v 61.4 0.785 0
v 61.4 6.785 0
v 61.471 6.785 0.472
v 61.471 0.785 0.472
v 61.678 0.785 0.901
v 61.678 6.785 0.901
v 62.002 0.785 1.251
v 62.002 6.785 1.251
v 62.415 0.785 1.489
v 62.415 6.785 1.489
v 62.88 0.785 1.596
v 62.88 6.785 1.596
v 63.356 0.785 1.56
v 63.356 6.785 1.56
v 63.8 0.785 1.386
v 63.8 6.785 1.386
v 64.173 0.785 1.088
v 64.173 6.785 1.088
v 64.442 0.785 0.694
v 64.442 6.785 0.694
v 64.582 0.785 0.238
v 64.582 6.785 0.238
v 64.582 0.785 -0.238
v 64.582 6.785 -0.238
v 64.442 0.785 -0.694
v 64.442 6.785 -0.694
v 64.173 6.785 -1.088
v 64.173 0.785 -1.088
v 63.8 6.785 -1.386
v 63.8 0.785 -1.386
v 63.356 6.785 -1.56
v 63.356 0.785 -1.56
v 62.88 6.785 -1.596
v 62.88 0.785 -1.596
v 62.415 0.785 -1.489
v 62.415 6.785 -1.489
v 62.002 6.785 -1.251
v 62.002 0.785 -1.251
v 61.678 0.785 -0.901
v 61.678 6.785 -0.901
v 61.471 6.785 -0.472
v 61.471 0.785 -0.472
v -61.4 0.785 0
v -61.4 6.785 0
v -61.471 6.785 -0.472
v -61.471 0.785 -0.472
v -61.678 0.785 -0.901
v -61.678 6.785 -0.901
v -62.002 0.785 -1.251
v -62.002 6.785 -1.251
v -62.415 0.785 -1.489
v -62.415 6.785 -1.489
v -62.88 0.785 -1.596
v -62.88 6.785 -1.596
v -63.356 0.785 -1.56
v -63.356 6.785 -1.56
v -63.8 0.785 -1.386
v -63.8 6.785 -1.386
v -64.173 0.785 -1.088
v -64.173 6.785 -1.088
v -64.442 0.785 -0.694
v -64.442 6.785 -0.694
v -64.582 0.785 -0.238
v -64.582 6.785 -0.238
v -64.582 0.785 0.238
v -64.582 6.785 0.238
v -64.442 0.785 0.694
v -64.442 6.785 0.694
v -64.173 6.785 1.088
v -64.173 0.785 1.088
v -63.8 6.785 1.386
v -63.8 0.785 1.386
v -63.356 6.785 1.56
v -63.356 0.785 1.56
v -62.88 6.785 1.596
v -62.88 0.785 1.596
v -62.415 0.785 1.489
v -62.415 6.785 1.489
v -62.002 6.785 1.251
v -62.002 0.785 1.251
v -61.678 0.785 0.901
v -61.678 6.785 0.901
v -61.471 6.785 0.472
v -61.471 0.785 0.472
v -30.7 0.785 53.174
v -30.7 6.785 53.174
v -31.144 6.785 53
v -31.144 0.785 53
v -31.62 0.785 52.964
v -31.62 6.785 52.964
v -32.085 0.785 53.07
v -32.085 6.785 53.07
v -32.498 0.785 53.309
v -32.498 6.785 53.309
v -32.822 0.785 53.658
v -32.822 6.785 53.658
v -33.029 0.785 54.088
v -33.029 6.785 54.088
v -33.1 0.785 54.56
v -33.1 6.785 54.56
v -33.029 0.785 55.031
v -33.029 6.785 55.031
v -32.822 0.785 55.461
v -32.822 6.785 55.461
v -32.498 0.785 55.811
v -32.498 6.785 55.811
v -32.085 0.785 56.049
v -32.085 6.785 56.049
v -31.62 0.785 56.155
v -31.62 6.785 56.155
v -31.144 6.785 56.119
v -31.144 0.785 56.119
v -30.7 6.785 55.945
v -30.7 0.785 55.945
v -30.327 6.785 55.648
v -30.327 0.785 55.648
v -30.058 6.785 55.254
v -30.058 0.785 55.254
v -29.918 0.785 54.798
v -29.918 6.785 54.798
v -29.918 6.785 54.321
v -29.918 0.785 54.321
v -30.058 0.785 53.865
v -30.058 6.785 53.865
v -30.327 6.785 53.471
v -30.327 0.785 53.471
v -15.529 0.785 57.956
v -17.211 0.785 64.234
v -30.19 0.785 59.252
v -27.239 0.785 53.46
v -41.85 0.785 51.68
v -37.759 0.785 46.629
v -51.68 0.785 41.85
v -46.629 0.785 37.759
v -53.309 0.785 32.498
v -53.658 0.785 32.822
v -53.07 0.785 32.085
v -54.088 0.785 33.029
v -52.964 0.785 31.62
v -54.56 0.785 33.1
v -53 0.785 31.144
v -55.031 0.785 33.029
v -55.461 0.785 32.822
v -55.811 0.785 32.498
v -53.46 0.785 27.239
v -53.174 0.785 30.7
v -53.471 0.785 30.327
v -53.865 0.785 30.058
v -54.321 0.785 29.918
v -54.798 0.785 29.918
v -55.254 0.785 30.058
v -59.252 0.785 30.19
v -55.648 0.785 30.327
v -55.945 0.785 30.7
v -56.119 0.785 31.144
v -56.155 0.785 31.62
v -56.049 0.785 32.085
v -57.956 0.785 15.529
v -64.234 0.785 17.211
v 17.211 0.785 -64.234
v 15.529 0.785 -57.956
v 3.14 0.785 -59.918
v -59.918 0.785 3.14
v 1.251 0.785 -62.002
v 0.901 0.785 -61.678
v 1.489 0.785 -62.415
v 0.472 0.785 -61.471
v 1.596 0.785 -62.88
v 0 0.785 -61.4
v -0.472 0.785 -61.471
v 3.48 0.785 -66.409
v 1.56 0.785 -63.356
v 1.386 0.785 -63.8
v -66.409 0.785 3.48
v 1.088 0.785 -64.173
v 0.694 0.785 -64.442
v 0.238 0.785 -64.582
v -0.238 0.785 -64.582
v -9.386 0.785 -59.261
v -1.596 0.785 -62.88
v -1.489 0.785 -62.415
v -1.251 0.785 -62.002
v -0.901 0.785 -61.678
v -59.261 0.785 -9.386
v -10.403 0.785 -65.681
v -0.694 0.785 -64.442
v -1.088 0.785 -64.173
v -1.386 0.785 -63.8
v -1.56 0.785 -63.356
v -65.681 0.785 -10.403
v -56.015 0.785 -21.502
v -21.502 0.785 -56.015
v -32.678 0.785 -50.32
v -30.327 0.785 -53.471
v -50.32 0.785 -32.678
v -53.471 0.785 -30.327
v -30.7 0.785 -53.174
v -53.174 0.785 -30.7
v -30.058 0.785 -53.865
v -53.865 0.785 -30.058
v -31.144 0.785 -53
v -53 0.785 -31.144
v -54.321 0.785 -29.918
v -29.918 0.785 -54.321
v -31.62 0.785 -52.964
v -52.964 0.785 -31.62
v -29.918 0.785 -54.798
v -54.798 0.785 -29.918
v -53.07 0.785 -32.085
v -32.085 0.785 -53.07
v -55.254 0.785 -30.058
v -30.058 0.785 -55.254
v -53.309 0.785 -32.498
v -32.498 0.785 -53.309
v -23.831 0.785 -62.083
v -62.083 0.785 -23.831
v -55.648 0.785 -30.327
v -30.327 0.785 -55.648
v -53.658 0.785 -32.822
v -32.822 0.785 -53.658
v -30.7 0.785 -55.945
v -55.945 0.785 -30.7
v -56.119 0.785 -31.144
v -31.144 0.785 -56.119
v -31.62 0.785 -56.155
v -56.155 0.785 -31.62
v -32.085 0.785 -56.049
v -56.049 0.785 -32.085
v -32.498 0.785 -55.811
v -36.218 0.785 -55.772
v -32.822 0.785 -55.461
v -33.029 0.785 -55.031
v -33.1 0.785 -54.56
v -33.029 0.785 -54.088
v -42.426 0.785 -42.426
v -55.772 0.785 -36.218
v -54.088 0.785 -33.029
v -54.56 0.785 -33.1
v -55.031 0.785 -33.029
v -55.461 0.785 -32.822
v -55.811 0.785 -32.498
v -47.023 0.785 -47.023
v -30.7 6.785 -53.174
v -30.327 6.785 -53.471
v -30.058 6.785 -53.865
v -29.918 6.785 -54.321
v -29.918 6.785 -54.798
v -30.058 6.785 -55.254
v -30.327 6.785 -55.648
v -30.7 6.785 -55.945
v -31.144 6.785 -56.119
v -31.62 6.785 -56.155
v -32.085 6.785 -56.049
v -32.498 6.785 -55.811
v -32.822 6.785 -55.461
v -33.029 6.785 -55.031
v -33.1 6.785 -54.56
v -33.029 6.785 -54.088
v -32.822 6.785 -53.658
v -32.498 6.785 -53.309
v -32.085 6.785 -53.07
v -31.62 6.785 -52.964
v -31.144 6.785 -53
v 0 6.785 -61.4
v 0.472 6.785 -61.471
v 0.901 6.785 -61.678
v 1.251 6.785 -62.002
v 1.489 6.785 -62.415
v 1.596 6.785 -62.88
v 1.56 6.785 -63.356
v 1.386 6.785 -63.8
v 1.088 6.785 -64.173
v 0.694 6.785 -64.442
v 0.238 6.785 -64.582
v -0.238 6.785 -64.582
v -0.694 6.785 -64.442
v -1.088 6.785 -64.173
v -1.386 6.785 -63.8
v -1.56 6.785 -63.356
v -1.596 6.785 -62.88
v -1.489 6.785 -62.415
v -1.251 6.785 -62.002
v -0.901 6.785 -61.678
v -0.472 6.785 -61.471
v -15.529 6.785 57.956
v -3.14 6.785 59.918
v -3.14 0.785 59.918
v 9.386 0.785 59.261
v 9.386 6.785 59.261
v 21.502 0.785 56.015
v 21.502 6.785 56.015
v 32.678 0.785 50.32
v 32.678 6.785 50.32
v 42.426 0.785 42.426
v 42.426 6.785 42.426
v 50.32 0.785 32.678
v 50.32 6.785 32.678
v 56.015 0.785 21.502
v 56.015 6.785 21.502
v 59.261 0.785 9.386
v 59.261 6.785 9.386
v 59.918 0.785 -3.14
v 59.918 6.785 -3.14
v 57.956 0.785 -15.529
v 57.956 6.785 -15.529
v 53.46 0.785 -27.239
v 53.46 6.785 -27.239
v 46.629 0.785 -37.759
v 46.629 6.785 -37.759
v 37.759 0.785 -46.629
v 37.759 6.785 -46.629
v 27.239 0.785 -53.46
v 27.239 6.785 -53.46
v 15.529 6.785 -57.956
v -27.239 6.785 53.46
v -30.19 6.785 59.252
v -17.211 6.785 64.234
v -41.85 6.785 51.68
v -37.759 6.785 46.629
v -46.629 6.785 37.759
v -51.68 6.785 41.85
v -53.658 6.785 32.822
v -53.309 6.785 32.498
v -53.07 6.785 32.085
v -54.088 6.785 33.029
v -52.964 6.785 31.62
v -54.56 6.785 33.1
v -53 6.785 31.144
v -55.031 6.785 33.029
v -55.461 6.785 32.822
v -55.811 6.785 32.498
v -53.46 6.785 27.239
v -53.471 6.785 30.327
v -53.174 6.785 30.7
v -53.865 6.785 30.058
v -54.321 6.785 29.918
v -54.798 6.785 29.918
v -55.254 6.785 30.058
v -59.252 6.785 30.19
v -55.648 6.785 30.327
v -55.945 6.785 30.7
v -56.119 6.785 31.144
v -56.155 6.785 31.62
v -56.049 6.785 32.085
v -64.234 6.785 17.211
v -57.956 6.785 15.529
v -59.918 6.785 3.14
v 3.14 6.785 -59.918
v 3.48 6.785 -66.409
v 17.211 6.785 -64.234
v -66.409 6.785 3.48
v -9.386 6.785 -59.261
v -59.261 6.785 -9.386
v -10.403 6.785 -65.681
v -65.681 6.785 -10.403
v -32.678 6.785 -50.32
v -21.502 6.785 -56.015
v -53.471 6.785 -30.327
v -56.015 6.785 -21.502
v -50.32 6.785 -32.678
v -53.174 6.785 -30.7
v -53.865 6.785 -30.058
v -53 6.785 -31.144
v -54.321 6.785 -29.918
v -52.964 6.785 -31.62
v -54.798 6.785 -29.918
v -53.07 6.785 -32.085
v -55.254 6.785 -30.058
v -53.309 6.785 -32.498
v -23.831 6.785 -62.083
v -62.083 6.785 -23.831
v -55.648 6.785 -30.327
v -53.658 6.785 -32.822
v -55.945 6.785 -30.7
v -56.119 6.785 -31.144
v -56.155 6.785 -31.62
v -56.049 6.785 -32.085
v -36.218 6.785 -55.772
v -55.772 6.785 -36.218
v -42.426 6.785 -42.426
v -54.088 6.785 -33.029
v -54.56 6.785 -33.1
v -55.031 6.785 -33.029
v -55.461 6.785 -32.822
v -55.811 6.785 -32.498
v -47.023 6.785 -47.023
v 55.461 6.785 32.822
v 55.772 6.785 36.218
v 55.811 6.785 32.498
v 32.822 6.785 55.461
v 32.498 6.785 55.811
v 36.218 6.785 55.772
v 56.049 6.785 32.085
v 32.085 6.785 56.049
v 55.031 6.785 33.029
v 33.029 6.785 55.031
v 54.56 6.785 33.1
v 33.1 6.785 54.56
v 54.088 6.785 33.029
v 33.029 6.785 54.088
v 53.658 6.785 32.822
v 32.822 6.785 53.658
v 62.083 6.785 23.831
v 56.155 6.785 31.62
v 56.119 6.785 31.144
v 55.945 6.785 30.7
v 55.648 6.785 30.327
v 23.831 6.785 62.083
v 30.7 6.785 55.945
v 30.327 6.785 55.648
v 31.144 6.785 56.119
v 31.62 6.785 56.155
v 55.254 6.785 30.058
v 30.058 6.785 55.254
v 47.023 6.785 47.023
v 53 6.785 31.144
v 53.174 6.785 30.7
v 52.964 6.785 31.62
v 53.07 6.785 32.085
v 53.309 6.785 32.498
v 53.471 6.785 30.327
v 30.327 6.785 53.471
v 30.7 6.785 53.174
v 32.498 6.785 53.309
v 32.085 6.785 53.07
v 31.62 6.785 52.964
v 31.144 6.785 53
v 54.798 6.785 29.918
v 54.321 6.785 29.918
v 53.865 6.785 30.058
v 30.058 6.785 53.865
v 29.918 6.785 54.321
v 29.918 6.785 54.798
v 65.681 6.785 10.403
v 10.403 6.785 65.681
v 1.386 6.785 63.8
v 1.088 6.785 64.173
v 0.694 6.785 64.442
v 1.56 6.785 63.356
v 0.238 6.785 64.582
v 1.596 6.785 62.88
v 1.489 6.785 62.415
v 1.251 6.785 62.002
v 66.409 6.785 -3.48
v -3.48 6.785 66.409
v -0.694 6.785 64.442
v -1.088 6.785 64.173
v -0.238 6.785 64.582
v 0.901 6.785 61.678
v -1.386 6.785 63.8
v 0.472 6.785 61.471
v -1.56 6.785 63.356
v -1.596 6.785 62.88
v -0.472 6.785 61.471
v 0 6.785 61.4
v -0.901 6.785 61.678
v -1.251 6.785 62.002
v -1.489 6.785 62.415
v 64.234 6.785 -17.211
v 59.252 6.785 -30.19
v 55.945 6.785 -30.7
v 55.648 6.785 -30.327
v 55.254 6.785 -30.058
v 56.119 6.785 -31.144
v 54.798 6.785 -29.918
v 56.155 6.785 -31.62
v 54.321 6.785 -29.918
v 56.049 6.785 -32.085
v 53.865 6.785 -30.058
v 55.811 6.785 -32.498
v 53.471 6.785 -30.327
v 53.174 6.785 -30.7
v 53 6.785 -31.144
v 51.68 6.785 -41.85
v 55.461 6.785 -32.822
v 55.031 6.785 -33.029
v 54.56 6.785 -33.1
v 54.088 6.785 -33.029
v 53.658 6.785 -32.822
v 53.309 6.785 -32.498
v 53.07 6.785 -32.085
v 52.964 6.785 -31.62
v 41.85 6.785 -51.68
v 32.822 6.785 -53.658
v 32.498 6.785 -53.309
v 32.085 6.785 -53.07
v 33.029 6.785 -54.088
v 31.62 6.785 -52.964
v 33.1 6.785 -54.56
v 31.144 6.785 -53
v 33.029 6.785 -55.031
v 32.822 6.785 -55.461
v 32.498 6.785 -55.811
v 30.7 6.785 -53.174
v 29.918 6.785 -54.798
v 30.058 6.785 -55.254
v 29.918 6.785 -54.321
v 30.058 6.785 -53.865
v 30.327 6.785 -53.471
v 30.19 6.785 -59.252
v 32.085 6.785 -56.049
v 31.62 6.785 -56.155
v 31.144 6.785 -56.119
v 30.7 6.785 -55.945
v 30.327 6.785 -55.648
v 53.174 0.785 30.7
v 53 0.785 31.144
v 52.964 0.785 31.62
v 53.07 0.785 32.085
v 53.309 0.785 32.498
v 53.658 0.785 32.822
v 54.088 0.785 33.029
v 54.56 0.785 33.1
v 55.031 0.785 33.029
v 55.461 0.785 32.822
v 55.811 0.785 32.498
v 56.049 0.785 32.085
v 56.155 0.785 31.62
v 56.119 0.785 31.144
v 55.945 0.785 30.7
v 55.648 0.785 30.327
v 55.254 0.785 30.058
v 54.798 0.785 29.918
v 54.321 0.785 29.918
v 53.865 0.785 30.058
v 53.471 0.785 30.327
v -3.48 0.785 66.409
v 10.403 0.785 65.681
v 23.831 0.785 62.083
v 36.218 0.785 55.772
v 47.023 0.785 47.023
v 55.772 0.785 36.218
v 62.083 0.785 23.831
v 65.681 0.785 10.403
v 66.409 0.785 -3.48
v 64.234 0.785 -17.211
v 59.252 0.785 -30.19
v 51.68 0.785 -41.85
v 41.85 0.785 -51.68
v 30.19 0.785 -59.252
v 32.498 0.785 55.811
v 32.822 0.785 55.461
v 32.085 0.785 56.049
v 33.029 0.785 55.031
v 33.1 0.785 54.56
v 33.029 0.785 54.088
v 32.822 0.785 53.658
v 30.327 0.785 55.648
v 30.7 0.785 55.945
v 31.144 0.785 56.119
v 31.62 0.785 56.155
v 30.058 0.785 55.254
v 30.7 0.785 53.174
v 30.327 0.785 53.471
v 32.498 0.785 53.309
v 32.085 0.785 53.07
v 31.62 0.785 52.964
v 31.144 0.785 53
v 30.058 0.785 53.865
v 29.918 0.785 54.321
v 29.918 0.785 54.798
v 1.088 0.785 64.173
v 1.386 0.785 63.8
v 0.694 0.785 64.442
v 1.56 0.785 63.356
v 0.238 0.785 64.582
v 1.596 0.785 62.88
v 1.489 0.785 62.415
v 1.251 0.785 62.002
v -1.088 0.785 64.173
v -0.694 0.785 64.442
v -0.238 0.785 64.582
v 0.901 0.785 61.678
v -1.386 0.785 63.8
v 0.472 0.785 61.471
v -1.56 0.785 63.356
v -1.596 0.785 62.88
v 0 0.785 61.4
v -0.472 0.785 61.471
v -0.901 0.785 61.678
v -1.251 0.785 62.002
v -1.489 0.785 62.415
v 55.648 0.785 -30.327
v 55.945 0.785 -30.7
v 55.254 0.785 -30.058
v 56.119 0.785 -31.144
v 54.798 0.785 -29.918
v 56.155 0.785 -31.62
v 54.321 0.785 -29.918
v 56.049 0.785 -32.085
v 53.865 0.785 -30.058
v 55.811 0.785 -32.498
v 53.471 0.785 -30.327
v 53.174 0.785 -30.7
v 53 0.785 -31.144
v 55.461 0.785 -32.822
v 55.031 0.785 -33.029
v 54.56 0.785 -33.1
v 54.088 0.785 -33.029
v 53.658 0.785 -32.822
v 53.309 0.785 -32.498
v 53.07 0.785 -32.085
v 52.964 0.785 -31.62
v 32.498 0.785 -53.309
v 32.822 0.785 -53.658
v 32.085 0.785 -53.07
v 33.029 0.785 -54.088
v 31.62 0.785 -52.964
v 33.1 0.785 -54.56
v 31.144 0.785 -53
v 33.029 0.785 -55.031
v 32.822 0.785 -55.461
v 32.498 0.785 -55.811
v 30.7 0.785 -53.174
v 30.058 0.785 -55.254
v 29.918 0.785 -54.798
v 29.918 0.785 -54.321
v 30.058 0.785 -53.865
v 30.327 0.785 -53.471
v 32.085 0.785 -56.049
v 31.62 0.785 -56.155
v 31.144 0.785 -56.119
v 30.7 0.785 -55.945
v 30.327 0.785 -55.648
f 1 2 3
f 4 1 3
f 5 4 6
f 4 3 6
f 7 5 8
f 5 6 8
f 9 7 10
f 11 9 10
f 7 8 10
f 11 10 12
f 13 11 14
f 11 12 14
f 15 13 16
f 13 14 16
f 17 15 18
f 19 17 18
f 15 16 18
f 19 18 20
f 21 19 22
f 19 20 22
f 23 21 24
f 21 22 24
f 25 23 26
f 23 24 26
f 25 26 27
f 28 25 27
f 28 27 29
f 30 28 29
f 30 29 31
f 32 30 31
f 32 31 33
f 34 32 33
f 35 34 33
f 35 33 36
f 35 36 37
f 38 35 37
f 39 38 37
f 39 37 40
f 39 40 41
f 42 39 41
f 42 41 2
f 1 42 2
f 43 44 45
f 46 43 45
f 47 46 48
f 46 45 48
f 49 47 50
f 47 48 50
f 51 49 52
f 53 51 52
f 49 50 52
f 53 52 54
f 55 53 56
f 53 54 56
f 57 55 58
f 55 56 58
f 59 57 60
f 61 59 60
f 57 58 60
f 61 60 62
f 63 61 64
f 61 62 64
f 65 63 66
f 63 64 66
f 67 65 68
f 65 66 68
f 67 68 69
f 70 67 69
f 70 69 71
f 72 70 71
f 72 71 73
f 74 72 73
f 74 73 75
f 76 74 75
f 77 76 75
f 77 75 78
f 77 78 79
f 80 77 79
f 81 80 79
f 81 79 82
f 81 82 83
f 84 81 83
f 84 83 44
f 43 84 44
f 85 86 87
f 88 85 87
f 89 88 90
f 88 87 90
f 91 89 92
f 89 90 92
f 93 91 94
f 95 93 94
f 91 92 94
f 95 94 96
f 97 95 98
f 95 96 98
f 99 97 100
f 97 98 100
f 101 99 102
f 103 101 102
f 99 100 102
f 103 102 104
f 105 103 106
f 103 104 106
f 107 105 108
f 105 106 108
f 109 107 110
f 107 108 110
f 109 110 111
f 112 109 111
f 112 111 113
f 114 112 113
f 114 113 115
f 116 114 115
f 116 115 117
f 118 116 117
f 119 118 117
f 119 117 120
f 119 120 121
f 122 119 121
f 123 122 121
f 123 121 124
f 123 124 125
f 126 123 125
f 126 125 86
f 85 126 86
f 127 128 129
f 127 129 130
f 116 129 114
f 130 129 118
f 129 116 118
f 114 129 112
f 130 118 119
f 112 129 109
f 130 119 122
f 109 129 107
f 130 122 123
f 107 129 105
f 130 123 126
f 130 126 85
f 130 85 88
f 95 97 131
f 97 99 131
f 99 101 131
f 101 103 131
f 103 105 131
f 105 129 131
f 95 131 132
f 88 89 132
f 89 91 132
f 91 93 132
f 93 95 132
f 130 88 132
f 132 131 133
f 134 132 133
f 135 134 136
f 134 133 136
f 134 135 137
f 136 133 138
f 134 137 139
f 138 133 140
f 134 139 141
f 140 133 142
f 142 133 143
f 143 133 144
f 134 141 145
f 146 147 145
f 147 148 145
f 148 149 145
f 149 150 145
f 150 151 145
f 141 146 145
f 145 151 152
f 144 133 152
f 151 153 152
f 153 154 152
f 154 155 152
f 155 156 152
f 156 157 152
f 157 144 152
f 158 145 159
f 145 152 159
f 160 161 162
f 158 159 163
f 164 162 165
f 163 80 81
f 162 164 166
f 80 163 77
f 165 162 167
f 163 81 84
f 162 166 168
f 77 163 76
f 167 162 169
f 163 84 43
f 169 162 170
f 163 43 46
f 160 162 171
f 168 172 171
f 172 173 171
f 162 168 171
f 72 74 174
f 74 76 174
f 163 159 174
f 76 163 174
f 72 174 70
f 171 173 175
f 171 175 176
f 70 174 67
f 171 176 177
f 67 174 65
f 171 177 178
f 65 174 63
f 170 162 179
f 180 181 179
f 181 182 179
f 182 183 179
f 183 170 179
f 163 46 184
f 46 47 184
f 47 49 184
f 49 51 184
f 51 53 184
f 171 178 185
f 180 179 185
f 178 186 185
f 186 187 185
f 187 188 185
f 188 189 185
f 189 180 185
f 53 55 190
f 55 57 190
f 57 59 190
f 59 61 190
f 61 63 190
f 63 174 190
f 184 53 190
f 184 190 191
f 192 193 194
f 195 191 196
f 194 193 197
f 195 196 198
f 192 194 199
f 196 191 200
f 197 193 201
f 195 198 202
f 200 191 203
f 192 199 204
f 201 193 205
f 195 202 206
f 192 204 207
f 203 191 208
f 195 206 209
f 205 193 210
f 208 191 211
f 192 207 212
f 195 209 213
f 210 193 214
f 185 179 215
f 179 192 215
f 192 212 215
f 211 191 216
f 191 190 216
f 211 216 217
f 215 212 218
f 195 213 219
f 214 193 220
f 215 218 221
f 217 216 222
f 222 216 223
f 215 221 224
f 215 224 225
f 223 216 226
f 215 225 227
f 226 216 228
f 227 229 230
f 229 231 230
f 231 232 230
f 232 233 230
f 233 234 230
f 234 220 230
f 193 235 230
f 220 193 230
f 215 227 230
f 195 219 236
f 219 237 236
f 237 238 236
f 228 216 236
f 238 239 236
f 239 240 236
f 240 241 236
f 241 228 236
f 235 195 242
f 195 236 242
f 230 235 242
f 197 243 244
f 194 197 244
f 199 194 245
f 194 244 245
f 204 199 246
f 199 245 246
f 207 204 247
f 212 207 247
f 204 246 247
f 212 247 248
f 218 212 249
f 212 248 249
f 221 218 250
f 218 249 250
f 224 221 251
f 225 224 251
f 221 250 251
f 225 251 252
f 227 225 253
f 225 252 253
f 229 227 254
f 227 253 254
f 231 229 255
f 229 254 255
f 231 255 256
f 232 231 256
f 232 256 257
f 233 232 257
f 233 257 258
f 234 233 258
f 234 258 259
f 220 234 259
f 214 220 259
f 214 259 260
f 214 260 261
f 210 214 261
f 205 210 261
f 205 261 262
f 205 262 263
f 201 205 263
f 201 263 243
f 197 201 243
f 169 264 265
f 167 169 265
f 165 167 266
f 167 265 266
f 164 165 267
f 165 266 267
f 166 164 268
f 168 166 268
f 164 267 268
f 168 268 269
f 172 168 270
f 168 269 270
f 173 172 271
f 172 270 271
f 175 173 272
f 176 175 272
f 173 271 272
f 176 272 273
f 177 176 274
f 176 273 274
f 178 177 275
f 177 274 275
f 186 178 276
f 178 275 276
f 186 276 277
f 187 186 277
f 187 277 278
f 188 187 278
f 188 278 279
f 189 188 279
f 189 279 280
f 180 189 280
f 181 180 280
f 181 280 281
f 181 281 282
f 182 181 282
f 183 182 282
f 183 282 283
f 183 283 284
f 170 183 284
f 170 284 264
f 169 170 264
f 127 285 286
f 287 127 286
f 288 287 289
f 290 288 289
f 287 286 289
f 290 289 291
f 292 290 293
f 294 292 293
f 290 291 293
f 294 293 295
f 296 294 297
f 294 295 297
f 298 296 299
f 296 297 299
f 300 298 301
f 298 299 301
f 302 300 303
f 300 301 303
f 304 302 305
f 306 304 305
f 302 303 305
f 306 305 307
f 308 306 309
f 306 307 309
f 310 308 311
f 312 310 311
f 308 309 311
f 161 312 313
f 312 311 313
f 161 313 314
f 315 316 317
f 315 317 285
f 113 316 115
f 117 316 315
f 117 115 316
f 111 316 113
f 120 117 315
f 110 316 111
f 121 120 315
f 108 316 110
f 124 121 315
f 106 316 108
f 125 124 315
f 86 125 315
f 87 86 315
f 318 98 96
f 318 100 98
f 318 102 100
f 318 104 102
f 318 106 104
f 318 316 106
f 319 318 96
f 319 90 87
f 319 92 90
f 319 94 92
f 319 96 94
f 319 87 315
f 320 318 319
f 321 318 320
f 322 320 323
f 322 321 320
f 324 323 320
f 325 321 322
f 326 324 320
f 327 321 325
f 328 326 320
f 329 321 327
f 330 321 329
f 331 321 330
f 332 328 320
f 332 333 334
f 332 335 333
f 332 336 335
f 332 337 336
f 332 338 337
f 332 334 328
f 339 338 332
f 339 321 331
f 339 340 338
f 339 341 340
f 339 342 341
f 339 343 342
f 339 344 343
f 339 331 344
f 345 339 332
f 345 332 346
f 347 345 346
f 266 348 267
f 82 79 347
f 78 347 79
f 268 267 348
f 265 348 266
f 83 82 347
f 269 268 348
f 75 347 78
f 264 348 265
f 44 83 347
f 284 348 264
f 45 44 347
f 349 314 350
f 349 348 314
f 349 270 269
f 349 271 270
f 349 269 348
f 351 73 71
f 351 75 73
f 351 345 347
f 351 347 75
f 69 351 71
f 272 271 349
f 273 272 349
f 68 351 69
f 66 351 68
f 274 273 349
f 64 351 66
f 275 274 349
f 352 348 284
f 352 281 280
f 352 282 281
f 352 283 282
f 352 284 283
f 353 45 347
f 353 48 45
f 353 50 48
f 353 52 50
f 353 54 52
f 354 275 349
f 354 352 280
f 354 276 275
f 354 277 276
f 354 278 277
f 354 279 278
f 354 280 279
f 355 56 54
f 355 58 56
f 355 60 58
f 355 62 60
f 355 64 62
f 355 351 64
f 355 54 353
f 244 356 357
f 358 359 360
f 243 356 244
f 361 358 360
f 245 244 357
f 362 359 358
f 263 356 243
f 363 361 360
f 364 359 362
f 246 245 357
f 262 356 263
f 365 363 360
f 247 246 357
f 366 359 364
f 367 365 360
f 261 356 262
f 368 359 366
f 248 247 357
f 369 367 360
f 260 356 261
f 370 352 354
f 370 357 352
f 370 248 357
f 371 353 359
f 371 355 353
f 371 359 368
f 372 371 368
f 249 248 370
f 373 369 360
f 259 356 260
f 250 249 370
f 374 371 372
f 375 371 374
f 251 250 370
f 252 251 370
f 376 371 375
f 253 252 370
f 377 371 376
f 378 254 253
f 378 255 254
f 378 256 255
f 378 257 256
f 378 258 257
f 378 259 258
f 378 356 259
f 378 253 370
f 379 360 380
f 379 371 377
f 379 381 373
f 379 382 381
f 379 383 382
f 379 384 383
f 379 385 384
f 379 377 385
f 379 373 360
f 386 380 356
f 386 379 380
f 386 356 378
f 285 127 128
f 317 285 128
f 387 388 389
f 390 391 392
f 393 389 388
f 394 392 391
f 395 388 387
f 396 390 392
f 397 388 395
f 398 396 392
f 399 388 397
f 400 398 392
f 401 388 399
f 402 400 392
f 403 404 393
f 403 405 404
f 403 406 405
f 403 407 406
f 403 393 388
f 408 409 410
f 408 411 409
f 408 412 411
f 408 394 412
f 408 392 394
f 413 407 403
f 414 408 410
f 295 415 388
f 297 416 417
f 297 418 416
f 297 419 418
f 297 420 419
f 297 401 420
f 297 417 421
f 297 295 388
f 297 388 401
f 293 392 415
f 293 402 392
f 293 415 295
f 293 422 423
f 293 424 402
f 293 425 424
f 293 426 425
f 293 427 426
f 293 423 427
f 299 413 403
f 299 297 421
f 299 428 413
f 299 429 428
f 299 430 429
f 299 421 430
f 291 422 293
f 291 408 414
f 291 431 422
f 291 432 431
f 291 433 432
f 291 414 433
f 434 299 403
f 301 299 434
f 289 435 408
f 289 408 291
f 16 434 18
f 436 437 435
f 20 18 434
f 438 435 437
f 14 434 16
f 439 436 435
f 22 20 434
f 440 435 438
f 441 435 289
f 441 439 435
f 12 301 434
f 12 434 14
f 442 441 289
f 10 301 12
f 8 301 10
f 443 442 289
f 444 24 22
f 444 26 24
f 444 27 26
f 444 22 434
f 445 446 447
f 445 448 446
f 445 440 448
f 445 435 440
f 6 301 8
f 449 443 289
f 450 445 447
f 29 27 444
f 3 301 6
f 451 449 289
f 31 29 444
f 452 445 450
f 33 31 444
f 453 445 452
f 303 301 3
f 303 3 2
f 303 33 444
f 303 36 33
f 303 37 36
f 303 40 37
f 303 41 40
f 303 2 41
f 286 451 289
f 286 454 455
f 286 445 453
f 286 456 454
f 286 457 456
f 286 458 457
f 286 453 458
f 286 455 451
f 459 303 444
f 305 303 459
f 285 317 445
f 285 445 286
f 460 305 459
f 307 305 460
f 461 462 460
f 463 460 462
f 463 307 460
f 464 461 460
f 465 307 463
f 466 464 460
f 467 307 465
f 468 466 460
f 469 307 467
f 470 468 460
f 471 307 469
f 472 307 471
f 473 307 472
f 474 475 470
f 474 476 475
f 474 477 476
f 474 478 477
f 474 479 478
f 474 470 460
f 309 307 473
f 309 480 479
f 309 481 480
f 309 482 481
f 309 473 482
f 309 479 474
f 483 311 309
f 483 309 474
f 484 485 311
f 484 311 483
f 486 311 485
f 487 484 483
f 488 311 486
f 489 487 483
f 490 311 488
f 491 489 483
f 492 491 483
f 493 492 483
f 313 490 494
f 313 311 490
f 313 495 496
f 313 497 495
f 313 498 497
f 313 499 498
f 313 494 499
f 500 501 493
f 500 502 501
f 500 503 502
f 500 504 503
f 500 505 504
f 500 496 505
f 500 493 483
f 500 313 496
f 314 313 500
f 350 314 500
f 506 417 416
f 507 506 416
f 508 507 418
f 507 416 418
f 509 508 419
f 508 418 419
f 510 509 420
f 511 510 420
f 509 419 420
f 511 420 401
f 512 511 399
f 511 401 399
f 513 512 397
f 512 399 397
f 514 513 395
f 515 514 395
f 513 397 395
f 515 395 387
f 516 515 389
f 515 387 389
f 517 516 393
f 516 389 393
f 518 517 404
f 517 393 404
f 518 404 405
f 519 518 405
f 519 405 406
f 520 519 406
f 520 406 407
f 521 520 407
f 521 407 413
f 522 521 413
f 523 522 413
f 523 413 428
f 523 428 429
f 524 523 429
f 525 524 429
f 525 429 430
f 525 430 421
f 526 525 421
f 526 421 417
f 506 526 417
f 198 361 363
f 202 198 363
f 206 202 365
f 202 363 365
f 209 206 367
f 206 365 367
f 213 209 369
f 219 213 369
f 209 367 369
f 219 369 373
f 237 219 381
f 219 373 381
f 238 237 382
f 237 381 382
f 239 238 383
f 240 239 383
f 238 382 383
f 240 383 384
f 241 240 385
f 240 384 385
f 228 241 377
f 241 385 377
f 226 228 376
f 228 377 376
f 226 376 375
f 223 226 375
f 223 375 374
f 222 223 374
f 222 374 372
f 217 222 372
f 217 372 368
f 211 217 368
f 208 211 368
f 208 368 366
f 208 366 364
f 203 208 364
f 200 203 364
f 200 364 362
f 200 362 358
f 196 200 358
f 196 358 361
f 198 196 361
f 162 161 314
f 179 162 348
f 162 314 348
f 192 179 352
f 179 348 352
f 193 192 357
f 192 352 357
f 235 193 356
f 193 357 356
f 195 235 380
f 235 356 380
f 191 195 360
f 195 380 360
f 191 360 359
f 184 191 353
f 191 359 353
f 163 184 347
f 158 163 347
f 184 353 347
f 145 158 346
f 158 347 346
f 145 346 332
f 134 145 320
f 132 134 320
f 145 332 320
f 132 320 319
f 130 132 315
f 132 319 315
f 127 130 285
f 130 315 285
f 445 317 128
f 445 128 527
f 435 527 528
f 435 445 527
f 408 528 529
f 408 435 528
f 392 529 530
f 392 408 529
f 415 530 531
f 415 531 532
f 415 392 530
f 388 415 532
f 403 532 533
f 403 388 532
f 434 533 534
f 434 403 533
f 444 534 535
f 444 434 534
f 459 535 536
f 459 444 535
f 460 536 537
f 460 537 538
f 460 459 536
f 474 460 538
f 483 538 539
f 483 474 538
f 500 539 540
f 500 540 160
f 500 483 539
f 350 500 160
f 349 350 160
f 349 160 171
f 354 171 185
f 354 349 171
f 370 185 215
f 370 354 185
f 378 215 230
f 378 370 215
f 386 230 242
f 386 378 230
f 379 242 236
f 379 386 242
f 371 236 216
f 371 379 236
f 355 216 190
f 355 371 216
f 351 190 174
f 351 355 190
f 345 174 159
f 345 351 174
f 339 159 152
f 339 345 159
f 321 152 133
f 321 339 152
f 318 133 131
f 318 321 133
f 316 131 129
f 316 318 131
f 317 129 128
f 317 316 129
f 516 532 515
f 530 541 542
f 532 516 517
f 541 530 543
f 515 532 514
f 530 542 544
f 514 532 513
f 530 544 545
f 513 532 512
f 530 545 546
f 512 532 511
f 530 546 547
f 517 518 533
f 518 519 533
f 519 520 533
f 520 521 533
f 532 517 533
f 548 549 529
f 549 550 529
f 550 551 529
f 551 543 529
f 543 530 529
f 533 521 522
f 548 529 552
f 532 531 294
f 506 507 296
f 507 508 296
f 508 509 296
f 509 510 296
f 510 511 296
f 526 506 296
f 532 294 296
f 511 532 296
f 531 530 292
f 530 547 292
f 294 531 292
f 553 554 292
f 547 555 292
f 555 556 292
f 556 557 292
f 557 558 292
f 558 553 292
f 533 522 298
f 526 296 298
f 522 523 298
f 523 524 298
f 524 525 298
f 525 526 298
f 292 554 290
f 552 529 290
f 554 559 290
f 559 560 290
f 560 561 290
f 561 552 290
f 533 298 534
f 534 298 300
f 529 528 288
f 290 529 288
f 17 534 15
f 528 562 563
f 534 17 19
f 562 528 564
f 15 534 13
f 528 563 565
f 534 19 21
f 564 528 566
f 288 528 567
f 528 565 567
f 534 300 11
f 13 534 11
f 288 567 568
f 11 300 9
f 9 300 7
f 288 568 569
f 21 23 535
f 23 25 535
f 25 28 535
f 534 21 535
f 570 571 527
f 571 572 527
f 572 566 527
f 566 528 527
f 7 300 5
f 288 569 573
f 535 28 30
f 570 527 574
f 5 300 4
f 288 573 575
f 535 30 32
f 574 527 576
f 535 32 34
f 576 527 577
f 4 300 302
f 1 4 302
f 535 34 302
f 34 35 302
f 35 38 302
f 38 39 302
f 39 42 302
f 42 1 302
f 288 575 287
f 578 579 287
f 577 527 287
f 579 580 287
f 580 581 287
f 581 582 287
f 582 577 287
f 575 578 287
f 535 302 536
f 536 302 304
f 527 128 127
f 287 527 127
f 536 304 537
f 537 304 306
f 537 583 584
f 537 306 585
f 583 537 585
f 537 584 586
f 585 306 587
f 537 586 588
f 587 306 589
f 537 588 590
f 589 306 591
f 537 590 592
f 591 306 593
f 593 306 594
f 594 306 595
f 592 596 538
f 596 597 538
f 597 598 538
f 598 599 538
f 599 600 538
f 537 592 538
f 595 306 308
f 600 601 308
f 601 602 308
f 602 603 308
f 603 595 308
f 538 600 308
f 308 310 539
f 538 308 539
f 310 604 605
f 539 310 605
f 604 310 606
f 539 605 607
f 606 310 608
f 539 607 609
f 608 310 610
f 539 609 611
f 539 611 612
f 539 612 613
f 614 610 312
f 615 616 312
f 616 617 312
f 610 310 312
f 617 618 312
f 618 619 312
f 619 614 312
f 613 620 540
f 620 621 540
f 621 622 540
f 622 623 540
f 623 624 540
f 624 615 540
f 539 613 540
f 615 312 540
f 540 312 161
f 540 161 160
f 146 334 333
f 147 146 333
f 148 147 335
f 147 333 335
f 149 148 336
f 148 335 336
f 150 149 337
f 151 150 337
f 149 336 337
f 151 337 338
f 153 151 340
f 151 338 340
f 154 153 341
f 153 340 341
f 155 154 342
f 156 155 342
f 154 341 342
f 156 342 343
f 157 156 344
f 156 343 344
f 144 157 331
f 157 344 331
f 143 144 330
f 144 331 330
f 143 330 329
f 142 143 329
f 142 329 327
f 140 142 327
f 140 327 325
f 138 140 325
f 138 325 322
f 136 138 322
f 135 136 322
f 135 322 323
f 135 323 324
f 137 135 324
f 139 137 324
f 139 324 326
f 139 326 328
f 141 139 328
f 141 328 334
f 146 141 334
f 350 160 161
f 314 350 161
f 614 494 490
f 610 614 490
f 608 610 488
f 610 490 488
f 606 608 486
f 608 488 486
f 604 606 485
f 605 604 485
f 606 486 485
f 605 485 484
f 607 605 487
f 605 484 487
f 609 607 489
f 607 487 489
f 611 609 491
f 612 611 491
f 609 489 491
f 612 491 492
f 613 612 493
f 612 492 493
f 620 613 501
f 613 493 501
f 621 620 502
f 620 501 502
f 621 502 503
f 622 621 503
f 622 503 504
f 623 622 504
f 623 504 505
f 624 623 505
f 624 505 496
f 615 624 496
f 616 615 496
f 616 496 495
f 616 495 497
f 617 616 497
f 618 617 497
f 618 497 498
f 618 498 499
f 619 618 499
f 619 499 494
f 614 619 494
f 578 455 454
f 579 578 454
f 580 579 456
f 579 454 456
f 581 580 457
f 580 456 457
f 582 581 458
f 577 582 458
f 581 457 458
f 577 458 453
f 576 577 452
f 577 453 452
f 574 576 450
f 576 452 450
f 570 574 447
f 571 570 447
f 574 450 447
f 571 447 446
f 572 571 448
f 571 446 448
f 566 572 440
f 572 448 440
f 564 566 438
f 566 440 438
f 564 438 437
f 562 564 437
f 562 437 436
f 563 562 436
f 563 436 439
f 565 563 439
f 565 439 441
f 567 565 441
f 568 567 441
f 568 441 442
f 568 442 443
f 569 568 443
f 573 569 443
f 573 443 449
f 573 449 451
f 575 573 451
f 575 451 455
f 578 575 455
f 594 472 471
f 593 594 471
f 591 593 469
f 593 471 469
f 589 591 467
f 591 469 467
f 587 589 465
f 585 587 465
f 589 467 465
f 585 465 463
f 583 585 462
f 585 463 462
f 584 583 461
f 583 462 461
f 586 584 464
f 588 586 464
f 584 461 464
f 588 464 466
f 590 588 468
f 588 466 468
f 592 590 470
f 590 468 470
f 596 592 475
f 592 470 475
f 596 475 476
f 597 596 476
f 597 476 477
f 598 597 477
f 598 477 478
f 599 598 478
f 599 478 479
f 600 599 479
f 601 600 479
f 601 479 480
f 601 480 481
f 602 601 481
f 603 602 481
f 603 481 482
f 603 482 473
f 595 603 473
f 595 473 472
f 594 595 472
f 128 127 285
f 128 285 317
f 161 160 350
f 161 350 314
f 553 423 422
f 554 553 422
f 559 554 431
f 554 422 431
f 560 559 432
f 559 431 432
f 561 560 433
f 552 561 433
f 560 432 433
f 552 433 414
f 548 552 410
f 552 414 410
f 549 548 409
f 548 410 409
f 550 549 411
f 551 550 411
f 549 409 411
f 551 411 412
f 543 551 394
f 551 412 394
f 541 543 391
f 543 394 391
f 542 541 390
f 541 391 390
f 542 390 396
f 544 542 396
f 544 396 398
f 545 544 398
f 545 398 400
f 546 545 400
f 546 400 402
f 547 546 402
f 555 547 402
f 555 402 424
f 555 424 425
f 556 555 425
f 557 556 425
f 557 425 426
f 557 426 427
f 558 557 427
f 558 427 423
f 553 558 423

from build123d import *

# Parameters (mm, degrees)
SKETCH1_W          = 6.5
SKETCH1_H          = 6
SKETCH2_R          = 1.6
CUT_EXTRUDE1_DEPTH = 95.236404855
CIRPATTERN1_COUNT  = 12


with BuildPart() as part:
    # Sketch1 → Revolve1 (revolve)
    with BuildSketch(Plane.XY):
        with Locations((-63.25, 3.785)):
            Rectangle(SKETCH1_W, SKETCH1_H)
    revolve(axis=Axis((0, -200069.047495165, 0), (0, 1, 0)))

    # Sketch2 → Cut-Extrude1 (cut, through all)
    with BuildSketch(Plane(origin=(0, 6.785, 0), x_dir=(1, 0, 0), z_dir=(0, 1, 0))):
        with Locations((0, 63)):
            Circle(SKETCH2_R)
    cut_extrude1 = extrude(amount=-CUT_EXTRUDE1_DEPTH, mode=Mode.SUBTRACT)

    # CirPattern1: Cut-Extrude1 ×12 about axis
    cirpattern1_axis = Axis((0, -200069.047495165, 0), (0, -1, 0))
    for i in range(1, CIRPATTERN1_COUNT):
        add(cut_extrude1.rotate(cirpattern1_axis, i * 360 / CIRPATTERN1_COUNT), mode=Mode.SUBTRACT)


with BuildPart() as body_2:
    # Split1: the piece on the far side of the plane
    add(part.part)
    split(bisect_by=Plane(origin=(0, 0, 0), x_dir=(-0.25881904510252135, 0, 0.9659258262890681), z_dir=(0.9659258262890681, 0, 0.25881904510252135)), keep=Keep.BOTTOM)


with BuildPart() as part_1:
    add(part.part)

    # Split1
    split(bisect_by=Plane(origin=(0, 0, 0), x_dir=(-0.25881904510252135, 0, 0.9659258262890681), z_dir=(0.9659258262890681, 0, 0.25881904510252135)), keep=Keep.TOP)


solid = Compound([body_2.part, part_1.part])
